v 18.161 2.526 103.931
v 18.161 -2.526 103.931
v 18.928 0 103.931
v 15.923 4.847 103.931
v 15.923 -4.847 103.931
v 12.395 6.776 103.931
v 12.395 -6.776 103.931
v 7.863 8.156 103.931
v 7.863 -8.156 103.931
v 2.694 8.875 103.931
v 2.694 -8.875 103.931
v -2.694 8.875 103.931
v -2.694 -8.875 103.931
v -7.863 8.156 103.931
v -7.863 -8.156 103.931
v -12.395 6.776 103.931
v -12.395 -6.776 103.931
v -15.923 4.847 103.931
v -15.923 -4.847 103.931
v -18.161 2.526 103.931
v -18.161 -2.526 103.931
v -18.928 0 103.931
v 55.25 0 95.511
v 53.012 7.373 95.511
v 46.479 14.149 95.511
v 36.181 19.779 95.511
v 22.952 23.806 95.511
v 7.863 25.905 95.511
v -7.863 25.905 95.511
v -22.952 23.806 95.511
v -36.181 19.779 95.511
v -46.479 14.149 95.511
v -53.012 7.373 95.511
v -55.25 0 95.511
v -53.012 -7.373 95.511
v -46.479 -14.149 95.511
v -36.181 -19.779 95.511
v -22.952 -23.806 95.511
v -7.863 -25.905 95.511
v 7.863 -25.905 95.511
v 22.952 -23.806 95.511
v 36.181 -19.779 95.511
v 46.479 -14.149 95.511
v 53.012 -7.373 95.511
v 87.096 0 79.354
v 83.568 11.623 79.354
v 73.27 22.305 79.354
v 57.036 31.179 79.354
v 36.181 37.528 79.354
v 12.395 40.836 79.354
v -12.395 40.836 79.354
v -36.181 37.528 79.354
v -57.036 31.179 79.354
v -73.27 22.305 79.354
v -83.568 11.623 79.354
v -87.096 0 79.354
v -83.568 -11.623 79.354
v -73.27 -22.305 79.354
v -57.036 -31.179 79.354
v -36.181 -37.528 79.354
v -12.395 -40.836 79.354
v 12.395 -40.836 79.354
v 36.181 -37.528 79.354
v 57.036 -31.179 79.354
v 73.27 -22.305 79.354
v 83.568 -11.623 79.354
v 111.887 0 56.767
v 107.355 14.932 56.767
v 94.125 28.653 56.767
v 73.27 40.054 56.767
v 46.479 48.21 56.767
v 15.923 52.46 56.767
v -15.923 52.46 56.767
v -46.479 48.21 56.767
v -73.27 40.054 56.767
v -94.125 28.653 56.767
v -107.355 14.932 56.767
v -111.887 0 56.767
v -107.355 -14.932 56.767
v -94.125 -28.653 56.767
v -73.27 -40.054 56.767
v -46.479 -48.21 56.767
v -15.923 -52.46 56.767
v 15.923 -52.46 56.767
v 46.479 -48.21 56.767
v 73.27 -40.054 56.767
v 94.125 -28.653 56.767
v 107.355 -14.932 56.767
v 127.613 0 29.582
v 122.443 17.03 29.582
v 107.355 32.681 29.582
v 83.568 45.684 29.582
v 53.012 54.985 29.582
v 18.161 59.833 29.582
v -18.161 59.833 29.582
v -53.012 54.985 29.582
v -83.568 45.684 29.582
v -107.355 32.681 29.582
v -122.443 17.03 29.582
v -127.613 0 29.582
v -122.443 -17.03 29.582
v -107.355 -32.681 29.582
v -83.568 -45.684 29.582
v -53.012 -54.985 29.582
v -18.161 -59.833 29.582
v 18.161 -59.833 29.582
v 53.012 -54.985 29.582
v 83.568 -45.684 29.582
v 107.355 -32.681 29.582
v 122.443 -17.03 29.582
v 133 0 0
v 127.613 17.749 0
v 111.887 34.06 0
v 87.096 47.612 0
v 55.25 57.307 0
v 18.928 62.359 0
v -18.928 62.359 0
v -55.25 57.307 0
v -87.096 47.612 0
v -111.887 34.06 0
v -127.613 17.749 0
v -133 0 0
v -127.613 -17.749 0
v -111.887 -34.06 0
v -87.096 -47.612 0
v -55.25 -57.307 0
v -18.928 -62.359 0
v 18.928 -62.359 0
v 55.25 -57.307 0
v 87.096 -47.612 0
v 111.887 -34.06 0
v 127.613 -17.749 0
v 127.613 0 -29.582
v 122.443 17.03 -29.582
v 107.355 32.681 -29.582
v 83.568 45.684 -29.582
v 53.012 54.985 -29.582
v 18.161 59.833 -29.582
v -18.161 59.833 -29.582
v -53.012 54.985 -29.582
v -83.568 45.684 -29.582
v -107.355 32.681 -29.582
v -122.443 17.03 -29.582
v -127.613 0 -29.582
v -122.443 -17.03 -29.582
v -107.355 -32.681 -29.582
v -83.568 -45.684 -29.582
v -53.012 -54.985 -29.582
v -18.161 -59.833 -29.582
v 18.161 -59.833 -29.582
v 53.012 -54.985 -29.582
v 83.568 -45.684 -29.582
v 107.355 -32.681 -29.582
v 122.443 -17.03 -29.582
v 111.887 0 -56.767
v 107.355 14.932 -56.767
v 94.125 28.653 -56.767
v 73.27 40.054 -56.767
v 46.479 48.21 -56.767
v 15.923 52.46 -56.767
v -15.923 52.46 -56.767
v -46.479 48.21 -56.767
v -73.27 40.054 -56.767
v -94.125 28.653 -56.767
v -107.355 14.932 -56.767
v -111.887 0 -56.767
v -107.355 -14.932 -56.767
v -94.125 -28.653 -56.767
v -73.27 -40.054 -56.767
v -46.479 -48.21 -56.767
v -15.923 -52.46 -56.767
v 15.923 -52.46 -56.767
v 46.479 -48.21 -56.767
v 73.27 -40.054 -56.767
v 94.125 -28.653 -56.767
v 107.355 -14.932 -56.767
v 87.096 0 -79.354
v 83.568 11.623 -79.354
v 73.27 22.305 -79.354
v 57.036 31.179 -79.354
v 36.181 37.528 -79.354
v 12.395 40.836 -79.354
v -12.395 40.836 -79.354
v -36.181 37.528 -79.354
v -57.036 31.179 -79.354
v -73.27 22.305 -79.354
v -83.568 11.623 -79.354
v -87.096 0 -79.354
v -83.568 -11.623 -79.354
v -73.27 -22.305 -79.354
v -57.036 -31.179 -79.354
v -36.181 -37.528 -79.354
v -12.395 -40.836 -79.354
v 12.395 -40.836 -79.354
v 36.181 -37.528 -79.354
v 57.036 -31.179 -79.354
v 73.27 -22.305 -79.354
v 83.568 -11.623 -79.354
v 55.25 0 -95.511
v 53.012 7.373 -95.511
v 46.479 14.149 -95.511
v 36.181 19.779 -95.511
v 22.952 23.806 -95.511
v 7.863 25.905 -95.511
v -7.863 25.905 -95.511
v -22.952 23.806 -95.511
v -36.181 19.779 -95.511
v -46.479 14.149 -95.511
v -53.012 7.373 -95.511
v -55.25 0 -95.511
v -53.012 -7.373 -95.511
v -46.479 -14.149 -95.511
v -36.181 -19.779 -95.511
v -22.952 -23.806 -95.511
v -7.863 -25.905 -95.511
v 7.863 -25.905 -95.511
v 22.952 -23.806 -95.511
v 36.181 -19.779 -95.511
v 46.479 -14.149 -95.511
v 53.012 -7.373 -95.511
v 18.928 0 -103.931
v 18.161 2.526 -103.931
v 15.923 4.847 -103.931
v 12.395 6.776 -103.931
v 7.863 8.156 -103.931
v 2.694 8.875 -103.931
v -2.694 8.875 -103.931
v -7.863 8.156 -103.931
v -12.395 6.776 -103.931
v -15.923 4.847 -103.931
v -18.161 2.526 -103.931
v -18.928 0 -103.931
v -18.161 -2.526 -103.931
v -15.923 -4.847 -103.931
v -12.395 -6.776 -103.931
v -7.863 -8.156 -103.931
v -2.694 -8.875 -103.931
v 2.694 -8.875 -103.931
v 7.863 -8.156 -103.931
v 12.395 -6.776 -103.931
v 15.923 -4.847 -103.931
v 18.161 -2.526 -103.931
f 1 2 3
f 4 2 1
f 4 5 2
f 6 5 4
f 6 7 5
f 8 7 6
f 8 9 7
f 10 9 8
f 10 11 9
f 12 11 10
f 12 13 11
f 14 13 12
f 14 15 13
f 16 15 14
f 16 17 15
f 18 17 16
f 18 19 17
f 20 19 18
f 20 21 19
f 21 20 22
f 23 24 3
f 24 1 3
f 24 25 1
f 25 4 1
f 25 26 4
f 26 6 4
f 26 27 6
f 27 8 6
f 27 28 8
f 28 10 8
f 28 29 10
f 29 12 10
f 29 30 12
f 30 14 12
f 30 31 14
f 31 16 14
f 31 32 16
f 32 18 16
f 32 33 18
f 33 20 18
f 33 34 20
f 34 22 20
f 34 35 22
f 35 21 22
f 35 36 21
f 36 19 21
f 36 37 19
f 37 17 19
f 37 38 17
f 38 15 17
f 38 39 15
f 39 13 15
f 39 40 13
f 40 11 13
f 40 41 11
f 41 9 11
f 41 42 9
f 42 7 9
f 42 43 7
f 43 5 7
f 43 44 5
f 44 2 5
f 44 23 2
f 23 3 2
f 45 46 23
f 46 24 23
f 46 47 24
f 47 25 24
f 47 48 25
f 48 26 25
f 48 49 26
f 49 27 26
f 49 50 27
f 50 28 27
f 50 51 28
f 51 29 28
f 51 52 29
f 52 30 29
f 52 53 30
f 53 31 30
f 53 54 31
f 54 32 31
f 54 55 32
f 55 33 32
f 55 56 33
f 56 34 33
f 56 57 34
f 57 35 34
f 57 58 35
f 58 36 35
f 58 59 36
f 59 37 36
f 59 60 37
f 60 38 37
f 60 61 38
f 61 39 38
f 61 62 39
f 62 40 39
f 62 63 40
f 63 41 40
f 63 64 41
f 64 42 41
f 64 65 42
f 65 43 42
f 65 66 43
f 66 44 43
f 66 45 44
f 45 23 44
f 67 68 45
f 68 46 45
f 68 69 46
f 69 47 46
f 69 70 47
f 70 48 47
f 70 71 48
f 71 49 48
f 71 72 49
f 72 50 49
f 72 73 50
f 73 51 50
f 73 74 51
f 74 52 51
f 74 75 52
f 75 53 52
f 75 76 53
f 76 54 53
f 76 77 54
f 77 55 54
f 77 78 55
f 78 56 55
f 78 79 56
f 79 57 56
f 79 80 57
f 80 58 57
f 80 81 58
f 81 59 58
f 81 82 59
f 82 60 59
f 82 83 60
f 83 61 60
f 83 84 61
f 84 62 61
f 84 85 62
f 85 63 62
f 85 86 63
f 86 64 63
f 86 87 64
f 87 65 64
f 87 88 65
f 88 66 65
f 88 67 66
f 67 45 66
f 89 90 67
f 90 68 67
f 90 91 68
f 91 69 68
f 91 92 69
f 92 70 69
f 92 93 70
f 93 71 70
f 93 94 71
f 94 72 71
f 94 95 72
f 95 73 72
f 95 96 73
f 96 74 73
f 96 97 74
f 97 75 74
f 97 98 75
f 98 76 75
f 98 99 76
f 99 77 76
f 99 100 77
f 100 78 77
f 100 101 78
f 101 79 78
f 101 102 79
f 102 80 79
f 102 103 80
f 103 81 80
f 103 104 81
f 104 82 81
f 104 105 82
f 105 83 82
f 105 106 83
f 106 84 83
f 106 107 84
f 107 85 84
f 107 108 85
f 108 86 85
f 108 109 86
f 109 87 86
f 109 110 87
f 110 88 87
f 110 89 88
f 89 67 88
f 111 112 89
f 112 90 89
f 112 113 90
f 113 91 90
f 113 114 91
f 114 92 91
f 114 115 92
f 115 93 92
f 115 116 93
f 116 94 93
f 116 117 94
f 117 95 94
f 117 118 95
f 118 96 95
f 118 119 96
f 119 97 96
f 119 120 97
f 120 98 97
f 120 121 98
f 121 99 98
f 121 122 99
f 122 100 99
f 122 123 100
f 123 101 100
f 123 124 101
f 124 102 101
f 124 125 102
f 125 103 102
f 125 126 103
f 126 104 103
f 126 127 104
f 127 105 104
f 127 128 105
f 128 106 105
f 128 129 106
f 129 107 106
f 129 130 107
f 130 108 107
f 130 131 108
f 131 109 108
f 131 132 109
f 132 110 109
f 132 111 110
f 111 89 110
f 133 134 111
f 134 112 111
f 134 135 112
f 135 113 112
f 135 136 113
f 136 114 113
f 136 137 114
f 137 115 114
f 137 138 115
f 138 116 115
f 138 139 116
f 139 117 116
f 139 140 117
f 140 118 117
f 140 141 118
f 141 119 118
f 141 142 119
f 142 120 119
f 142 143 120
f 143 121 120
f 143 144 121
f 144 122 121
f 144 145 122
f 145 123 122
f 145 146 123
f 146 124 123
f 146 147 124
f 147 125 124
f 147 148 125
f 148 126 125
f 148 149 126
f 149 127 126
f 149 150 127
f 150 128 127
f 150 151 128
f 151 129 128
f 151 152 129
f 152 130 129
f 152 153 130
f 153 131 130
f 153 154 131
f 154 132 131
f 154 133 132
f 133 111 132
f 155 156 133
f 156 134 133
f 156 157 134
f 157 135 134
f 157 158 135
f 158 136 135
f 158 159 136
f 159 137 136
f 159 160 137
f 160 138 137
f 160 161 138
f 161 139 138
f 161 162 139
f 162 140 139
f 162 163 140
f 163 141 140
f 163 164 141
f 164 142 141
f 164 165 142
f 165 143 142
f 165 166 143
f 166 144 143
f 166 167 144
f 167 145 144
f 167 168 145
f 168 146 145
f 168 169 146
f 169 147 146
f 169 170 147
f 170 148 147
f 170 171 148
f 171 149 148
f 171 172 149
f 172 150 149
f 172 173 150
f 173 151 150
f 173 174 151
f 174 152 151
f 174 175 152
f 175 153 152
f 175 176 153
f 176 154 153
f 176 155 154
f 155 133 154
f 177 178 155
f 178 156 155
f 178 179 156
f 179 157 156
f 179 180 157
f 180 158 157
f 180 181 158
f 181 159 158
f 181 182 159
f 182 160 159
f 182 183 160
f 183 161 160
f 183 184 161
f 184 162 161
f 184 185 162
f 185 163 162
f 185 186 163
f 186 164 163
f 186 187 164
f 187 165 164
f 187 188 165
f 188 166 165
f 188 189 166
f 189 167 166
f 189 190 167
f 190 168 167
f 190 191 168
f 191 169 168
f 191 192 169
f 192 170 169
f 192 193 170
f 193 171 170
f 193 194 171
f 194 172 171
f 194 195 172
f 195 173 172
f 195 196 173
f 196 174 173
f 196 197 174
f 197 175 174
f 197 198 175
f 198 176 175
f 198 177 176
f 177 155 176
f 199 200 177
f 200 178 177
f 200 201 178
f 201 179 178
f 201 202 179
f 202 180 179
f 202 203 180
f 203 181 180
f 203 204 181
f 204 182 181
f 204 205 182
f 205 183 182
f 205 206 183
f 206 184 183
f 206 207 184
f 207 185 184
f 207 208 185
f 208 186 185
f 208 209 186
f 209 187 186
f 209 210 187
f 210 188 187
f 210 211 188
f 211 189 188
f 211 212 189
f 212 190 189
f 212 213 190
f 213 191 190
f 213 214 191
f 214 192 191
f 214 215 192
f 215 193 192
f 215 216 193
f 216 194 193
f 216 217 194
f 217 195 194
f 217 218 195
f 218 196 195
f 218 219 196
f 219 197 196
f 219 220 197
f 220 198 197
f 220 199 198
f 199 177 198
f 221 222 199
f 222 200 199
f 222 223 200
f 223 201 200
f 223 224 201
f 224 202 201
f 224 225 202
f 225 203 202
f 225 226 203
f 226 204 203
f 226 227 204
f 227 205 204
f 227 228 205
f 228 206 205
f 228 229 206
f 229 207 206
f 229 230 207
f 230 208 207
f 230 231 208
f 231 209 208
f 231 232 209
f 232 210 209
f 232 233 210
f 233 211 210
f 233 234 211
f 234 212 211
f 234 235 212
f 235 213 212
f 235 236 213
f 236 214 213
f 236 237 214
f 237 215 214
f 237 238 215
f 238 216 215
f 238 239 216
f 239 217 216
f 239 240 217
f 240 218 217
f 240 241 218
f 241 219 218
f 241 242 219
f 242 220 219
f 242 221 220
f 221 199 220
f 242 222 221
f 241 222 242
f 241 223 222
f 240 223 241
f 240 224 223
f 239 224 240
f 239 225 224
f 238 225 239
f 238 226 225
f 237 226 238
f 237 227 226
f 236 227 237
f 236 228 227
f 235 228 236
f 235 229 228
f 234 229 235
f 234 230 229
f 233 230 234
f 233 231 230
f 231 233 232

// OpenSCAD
// Generated by SolidPython 1.0.1 on 2020-07-29 00:46:54


scale(v = [19, 9, 15]) {
	sphere(r = 7);
}
/***********************************************
*********      SolidPython code:      **********
************************************************
 
# import packages: SolidPython
from solid import *
from solid.utils import *
from itertools import chain, combinations, permutations


class Resize:

    def __init__(self, scad_file):
        self.scad_file = scad_file
        #self.scad_file = import_scad(scad_file)
        # cone/cylinder param:
        self.r1 = 0
        self.r2 = 0
        self.h = 0
        # rectangular prism param:
        self.w = 0
        self.l = 0
        # ellipse param:
        self.r = 0

    # import OpenScad code (file name corresponds to shape)


    # classify shape + parameters
    def assign(self, param1, param2, param3):
        if self.scad_file == 'cone.scad':
            self.r1 = param1
            self.r2 = param2
            self.h = param3
        elif self.scad_file == 'cylinder.scad':
            self.r1 = param1
            self.r2 = param2
            self.h = param3
        elif self.scad_file == 'rectangularPrism.scad':
            self.h = param1
            self.l = param2
            self.w = param3
        else:
            self.r = param1
            self.h = param2

    # resize parameters
    def iterate(self):
        x = range(3, 20, 2)
        i = 1
        if self.scad_file == 'cone.scad':
            tempList = list(permutations(x, 2))
            for temp in tempList:
                param1 = temp[0]
                param2 = temp[1]
                filepath = 'produced_scad_files/' + 'cone' + str(param1) + '_' + str(param2) + '_' + '.scad'
                scad_render_to_file(cylinder(h=param1, r1=param2, r2=0), filepath)

        elif self.scad_file == 'cylinder.scad':
            tempList = list(permutations(x, 3))
            for temp in tempList:
                param1 = temp[0]
                param2 = temp[1]
                filepath = 'produced_scad_files/' + 'cylinder' + str(param1) + '_' + str(param2) + '_' + '.scad'
                scad_render_to_file(cylinder(h=param1, r1=param2, r2=param2), filepath)

        elif self.scad_file == 'rectangularPrism.scad':
            tempList = list(permutations(x, 3))
            for temp in tempList:
                param1 = temp[0]
                param2 = temp[1]
                param3 = temp[2]
                filepath = 'produced_scad_files/' + 'rectangularPrism' + str(param1) + '_' + str(param2) + '_' + str(
                    param3) + '.scad'
                scad_render_to_file(cube(size=(param1, param2, param3)), filepath)

        elif self.scad_file == 'ellipse.scad':
            tempList = list(permutations(x, 4))
            for temp in tempList:
                param1 = temp[0]
                param2 = temp[1]
                param3 = temp[2]
                param4 = temp[3]
                filepath = 'produced_scad_files/' + 'ellipse' + str(param1) + '_' + str(param2) + '_' + str(param3) + '_' + str(param4) + '.scad'
                scad_render_to_file(scale([param1, param2, param3])(sphere(r=param4)), filepath)

    def render_to_scadfile(self):
        scad_render_to_file(scad, 'example.scad') 
 
************************************************/
